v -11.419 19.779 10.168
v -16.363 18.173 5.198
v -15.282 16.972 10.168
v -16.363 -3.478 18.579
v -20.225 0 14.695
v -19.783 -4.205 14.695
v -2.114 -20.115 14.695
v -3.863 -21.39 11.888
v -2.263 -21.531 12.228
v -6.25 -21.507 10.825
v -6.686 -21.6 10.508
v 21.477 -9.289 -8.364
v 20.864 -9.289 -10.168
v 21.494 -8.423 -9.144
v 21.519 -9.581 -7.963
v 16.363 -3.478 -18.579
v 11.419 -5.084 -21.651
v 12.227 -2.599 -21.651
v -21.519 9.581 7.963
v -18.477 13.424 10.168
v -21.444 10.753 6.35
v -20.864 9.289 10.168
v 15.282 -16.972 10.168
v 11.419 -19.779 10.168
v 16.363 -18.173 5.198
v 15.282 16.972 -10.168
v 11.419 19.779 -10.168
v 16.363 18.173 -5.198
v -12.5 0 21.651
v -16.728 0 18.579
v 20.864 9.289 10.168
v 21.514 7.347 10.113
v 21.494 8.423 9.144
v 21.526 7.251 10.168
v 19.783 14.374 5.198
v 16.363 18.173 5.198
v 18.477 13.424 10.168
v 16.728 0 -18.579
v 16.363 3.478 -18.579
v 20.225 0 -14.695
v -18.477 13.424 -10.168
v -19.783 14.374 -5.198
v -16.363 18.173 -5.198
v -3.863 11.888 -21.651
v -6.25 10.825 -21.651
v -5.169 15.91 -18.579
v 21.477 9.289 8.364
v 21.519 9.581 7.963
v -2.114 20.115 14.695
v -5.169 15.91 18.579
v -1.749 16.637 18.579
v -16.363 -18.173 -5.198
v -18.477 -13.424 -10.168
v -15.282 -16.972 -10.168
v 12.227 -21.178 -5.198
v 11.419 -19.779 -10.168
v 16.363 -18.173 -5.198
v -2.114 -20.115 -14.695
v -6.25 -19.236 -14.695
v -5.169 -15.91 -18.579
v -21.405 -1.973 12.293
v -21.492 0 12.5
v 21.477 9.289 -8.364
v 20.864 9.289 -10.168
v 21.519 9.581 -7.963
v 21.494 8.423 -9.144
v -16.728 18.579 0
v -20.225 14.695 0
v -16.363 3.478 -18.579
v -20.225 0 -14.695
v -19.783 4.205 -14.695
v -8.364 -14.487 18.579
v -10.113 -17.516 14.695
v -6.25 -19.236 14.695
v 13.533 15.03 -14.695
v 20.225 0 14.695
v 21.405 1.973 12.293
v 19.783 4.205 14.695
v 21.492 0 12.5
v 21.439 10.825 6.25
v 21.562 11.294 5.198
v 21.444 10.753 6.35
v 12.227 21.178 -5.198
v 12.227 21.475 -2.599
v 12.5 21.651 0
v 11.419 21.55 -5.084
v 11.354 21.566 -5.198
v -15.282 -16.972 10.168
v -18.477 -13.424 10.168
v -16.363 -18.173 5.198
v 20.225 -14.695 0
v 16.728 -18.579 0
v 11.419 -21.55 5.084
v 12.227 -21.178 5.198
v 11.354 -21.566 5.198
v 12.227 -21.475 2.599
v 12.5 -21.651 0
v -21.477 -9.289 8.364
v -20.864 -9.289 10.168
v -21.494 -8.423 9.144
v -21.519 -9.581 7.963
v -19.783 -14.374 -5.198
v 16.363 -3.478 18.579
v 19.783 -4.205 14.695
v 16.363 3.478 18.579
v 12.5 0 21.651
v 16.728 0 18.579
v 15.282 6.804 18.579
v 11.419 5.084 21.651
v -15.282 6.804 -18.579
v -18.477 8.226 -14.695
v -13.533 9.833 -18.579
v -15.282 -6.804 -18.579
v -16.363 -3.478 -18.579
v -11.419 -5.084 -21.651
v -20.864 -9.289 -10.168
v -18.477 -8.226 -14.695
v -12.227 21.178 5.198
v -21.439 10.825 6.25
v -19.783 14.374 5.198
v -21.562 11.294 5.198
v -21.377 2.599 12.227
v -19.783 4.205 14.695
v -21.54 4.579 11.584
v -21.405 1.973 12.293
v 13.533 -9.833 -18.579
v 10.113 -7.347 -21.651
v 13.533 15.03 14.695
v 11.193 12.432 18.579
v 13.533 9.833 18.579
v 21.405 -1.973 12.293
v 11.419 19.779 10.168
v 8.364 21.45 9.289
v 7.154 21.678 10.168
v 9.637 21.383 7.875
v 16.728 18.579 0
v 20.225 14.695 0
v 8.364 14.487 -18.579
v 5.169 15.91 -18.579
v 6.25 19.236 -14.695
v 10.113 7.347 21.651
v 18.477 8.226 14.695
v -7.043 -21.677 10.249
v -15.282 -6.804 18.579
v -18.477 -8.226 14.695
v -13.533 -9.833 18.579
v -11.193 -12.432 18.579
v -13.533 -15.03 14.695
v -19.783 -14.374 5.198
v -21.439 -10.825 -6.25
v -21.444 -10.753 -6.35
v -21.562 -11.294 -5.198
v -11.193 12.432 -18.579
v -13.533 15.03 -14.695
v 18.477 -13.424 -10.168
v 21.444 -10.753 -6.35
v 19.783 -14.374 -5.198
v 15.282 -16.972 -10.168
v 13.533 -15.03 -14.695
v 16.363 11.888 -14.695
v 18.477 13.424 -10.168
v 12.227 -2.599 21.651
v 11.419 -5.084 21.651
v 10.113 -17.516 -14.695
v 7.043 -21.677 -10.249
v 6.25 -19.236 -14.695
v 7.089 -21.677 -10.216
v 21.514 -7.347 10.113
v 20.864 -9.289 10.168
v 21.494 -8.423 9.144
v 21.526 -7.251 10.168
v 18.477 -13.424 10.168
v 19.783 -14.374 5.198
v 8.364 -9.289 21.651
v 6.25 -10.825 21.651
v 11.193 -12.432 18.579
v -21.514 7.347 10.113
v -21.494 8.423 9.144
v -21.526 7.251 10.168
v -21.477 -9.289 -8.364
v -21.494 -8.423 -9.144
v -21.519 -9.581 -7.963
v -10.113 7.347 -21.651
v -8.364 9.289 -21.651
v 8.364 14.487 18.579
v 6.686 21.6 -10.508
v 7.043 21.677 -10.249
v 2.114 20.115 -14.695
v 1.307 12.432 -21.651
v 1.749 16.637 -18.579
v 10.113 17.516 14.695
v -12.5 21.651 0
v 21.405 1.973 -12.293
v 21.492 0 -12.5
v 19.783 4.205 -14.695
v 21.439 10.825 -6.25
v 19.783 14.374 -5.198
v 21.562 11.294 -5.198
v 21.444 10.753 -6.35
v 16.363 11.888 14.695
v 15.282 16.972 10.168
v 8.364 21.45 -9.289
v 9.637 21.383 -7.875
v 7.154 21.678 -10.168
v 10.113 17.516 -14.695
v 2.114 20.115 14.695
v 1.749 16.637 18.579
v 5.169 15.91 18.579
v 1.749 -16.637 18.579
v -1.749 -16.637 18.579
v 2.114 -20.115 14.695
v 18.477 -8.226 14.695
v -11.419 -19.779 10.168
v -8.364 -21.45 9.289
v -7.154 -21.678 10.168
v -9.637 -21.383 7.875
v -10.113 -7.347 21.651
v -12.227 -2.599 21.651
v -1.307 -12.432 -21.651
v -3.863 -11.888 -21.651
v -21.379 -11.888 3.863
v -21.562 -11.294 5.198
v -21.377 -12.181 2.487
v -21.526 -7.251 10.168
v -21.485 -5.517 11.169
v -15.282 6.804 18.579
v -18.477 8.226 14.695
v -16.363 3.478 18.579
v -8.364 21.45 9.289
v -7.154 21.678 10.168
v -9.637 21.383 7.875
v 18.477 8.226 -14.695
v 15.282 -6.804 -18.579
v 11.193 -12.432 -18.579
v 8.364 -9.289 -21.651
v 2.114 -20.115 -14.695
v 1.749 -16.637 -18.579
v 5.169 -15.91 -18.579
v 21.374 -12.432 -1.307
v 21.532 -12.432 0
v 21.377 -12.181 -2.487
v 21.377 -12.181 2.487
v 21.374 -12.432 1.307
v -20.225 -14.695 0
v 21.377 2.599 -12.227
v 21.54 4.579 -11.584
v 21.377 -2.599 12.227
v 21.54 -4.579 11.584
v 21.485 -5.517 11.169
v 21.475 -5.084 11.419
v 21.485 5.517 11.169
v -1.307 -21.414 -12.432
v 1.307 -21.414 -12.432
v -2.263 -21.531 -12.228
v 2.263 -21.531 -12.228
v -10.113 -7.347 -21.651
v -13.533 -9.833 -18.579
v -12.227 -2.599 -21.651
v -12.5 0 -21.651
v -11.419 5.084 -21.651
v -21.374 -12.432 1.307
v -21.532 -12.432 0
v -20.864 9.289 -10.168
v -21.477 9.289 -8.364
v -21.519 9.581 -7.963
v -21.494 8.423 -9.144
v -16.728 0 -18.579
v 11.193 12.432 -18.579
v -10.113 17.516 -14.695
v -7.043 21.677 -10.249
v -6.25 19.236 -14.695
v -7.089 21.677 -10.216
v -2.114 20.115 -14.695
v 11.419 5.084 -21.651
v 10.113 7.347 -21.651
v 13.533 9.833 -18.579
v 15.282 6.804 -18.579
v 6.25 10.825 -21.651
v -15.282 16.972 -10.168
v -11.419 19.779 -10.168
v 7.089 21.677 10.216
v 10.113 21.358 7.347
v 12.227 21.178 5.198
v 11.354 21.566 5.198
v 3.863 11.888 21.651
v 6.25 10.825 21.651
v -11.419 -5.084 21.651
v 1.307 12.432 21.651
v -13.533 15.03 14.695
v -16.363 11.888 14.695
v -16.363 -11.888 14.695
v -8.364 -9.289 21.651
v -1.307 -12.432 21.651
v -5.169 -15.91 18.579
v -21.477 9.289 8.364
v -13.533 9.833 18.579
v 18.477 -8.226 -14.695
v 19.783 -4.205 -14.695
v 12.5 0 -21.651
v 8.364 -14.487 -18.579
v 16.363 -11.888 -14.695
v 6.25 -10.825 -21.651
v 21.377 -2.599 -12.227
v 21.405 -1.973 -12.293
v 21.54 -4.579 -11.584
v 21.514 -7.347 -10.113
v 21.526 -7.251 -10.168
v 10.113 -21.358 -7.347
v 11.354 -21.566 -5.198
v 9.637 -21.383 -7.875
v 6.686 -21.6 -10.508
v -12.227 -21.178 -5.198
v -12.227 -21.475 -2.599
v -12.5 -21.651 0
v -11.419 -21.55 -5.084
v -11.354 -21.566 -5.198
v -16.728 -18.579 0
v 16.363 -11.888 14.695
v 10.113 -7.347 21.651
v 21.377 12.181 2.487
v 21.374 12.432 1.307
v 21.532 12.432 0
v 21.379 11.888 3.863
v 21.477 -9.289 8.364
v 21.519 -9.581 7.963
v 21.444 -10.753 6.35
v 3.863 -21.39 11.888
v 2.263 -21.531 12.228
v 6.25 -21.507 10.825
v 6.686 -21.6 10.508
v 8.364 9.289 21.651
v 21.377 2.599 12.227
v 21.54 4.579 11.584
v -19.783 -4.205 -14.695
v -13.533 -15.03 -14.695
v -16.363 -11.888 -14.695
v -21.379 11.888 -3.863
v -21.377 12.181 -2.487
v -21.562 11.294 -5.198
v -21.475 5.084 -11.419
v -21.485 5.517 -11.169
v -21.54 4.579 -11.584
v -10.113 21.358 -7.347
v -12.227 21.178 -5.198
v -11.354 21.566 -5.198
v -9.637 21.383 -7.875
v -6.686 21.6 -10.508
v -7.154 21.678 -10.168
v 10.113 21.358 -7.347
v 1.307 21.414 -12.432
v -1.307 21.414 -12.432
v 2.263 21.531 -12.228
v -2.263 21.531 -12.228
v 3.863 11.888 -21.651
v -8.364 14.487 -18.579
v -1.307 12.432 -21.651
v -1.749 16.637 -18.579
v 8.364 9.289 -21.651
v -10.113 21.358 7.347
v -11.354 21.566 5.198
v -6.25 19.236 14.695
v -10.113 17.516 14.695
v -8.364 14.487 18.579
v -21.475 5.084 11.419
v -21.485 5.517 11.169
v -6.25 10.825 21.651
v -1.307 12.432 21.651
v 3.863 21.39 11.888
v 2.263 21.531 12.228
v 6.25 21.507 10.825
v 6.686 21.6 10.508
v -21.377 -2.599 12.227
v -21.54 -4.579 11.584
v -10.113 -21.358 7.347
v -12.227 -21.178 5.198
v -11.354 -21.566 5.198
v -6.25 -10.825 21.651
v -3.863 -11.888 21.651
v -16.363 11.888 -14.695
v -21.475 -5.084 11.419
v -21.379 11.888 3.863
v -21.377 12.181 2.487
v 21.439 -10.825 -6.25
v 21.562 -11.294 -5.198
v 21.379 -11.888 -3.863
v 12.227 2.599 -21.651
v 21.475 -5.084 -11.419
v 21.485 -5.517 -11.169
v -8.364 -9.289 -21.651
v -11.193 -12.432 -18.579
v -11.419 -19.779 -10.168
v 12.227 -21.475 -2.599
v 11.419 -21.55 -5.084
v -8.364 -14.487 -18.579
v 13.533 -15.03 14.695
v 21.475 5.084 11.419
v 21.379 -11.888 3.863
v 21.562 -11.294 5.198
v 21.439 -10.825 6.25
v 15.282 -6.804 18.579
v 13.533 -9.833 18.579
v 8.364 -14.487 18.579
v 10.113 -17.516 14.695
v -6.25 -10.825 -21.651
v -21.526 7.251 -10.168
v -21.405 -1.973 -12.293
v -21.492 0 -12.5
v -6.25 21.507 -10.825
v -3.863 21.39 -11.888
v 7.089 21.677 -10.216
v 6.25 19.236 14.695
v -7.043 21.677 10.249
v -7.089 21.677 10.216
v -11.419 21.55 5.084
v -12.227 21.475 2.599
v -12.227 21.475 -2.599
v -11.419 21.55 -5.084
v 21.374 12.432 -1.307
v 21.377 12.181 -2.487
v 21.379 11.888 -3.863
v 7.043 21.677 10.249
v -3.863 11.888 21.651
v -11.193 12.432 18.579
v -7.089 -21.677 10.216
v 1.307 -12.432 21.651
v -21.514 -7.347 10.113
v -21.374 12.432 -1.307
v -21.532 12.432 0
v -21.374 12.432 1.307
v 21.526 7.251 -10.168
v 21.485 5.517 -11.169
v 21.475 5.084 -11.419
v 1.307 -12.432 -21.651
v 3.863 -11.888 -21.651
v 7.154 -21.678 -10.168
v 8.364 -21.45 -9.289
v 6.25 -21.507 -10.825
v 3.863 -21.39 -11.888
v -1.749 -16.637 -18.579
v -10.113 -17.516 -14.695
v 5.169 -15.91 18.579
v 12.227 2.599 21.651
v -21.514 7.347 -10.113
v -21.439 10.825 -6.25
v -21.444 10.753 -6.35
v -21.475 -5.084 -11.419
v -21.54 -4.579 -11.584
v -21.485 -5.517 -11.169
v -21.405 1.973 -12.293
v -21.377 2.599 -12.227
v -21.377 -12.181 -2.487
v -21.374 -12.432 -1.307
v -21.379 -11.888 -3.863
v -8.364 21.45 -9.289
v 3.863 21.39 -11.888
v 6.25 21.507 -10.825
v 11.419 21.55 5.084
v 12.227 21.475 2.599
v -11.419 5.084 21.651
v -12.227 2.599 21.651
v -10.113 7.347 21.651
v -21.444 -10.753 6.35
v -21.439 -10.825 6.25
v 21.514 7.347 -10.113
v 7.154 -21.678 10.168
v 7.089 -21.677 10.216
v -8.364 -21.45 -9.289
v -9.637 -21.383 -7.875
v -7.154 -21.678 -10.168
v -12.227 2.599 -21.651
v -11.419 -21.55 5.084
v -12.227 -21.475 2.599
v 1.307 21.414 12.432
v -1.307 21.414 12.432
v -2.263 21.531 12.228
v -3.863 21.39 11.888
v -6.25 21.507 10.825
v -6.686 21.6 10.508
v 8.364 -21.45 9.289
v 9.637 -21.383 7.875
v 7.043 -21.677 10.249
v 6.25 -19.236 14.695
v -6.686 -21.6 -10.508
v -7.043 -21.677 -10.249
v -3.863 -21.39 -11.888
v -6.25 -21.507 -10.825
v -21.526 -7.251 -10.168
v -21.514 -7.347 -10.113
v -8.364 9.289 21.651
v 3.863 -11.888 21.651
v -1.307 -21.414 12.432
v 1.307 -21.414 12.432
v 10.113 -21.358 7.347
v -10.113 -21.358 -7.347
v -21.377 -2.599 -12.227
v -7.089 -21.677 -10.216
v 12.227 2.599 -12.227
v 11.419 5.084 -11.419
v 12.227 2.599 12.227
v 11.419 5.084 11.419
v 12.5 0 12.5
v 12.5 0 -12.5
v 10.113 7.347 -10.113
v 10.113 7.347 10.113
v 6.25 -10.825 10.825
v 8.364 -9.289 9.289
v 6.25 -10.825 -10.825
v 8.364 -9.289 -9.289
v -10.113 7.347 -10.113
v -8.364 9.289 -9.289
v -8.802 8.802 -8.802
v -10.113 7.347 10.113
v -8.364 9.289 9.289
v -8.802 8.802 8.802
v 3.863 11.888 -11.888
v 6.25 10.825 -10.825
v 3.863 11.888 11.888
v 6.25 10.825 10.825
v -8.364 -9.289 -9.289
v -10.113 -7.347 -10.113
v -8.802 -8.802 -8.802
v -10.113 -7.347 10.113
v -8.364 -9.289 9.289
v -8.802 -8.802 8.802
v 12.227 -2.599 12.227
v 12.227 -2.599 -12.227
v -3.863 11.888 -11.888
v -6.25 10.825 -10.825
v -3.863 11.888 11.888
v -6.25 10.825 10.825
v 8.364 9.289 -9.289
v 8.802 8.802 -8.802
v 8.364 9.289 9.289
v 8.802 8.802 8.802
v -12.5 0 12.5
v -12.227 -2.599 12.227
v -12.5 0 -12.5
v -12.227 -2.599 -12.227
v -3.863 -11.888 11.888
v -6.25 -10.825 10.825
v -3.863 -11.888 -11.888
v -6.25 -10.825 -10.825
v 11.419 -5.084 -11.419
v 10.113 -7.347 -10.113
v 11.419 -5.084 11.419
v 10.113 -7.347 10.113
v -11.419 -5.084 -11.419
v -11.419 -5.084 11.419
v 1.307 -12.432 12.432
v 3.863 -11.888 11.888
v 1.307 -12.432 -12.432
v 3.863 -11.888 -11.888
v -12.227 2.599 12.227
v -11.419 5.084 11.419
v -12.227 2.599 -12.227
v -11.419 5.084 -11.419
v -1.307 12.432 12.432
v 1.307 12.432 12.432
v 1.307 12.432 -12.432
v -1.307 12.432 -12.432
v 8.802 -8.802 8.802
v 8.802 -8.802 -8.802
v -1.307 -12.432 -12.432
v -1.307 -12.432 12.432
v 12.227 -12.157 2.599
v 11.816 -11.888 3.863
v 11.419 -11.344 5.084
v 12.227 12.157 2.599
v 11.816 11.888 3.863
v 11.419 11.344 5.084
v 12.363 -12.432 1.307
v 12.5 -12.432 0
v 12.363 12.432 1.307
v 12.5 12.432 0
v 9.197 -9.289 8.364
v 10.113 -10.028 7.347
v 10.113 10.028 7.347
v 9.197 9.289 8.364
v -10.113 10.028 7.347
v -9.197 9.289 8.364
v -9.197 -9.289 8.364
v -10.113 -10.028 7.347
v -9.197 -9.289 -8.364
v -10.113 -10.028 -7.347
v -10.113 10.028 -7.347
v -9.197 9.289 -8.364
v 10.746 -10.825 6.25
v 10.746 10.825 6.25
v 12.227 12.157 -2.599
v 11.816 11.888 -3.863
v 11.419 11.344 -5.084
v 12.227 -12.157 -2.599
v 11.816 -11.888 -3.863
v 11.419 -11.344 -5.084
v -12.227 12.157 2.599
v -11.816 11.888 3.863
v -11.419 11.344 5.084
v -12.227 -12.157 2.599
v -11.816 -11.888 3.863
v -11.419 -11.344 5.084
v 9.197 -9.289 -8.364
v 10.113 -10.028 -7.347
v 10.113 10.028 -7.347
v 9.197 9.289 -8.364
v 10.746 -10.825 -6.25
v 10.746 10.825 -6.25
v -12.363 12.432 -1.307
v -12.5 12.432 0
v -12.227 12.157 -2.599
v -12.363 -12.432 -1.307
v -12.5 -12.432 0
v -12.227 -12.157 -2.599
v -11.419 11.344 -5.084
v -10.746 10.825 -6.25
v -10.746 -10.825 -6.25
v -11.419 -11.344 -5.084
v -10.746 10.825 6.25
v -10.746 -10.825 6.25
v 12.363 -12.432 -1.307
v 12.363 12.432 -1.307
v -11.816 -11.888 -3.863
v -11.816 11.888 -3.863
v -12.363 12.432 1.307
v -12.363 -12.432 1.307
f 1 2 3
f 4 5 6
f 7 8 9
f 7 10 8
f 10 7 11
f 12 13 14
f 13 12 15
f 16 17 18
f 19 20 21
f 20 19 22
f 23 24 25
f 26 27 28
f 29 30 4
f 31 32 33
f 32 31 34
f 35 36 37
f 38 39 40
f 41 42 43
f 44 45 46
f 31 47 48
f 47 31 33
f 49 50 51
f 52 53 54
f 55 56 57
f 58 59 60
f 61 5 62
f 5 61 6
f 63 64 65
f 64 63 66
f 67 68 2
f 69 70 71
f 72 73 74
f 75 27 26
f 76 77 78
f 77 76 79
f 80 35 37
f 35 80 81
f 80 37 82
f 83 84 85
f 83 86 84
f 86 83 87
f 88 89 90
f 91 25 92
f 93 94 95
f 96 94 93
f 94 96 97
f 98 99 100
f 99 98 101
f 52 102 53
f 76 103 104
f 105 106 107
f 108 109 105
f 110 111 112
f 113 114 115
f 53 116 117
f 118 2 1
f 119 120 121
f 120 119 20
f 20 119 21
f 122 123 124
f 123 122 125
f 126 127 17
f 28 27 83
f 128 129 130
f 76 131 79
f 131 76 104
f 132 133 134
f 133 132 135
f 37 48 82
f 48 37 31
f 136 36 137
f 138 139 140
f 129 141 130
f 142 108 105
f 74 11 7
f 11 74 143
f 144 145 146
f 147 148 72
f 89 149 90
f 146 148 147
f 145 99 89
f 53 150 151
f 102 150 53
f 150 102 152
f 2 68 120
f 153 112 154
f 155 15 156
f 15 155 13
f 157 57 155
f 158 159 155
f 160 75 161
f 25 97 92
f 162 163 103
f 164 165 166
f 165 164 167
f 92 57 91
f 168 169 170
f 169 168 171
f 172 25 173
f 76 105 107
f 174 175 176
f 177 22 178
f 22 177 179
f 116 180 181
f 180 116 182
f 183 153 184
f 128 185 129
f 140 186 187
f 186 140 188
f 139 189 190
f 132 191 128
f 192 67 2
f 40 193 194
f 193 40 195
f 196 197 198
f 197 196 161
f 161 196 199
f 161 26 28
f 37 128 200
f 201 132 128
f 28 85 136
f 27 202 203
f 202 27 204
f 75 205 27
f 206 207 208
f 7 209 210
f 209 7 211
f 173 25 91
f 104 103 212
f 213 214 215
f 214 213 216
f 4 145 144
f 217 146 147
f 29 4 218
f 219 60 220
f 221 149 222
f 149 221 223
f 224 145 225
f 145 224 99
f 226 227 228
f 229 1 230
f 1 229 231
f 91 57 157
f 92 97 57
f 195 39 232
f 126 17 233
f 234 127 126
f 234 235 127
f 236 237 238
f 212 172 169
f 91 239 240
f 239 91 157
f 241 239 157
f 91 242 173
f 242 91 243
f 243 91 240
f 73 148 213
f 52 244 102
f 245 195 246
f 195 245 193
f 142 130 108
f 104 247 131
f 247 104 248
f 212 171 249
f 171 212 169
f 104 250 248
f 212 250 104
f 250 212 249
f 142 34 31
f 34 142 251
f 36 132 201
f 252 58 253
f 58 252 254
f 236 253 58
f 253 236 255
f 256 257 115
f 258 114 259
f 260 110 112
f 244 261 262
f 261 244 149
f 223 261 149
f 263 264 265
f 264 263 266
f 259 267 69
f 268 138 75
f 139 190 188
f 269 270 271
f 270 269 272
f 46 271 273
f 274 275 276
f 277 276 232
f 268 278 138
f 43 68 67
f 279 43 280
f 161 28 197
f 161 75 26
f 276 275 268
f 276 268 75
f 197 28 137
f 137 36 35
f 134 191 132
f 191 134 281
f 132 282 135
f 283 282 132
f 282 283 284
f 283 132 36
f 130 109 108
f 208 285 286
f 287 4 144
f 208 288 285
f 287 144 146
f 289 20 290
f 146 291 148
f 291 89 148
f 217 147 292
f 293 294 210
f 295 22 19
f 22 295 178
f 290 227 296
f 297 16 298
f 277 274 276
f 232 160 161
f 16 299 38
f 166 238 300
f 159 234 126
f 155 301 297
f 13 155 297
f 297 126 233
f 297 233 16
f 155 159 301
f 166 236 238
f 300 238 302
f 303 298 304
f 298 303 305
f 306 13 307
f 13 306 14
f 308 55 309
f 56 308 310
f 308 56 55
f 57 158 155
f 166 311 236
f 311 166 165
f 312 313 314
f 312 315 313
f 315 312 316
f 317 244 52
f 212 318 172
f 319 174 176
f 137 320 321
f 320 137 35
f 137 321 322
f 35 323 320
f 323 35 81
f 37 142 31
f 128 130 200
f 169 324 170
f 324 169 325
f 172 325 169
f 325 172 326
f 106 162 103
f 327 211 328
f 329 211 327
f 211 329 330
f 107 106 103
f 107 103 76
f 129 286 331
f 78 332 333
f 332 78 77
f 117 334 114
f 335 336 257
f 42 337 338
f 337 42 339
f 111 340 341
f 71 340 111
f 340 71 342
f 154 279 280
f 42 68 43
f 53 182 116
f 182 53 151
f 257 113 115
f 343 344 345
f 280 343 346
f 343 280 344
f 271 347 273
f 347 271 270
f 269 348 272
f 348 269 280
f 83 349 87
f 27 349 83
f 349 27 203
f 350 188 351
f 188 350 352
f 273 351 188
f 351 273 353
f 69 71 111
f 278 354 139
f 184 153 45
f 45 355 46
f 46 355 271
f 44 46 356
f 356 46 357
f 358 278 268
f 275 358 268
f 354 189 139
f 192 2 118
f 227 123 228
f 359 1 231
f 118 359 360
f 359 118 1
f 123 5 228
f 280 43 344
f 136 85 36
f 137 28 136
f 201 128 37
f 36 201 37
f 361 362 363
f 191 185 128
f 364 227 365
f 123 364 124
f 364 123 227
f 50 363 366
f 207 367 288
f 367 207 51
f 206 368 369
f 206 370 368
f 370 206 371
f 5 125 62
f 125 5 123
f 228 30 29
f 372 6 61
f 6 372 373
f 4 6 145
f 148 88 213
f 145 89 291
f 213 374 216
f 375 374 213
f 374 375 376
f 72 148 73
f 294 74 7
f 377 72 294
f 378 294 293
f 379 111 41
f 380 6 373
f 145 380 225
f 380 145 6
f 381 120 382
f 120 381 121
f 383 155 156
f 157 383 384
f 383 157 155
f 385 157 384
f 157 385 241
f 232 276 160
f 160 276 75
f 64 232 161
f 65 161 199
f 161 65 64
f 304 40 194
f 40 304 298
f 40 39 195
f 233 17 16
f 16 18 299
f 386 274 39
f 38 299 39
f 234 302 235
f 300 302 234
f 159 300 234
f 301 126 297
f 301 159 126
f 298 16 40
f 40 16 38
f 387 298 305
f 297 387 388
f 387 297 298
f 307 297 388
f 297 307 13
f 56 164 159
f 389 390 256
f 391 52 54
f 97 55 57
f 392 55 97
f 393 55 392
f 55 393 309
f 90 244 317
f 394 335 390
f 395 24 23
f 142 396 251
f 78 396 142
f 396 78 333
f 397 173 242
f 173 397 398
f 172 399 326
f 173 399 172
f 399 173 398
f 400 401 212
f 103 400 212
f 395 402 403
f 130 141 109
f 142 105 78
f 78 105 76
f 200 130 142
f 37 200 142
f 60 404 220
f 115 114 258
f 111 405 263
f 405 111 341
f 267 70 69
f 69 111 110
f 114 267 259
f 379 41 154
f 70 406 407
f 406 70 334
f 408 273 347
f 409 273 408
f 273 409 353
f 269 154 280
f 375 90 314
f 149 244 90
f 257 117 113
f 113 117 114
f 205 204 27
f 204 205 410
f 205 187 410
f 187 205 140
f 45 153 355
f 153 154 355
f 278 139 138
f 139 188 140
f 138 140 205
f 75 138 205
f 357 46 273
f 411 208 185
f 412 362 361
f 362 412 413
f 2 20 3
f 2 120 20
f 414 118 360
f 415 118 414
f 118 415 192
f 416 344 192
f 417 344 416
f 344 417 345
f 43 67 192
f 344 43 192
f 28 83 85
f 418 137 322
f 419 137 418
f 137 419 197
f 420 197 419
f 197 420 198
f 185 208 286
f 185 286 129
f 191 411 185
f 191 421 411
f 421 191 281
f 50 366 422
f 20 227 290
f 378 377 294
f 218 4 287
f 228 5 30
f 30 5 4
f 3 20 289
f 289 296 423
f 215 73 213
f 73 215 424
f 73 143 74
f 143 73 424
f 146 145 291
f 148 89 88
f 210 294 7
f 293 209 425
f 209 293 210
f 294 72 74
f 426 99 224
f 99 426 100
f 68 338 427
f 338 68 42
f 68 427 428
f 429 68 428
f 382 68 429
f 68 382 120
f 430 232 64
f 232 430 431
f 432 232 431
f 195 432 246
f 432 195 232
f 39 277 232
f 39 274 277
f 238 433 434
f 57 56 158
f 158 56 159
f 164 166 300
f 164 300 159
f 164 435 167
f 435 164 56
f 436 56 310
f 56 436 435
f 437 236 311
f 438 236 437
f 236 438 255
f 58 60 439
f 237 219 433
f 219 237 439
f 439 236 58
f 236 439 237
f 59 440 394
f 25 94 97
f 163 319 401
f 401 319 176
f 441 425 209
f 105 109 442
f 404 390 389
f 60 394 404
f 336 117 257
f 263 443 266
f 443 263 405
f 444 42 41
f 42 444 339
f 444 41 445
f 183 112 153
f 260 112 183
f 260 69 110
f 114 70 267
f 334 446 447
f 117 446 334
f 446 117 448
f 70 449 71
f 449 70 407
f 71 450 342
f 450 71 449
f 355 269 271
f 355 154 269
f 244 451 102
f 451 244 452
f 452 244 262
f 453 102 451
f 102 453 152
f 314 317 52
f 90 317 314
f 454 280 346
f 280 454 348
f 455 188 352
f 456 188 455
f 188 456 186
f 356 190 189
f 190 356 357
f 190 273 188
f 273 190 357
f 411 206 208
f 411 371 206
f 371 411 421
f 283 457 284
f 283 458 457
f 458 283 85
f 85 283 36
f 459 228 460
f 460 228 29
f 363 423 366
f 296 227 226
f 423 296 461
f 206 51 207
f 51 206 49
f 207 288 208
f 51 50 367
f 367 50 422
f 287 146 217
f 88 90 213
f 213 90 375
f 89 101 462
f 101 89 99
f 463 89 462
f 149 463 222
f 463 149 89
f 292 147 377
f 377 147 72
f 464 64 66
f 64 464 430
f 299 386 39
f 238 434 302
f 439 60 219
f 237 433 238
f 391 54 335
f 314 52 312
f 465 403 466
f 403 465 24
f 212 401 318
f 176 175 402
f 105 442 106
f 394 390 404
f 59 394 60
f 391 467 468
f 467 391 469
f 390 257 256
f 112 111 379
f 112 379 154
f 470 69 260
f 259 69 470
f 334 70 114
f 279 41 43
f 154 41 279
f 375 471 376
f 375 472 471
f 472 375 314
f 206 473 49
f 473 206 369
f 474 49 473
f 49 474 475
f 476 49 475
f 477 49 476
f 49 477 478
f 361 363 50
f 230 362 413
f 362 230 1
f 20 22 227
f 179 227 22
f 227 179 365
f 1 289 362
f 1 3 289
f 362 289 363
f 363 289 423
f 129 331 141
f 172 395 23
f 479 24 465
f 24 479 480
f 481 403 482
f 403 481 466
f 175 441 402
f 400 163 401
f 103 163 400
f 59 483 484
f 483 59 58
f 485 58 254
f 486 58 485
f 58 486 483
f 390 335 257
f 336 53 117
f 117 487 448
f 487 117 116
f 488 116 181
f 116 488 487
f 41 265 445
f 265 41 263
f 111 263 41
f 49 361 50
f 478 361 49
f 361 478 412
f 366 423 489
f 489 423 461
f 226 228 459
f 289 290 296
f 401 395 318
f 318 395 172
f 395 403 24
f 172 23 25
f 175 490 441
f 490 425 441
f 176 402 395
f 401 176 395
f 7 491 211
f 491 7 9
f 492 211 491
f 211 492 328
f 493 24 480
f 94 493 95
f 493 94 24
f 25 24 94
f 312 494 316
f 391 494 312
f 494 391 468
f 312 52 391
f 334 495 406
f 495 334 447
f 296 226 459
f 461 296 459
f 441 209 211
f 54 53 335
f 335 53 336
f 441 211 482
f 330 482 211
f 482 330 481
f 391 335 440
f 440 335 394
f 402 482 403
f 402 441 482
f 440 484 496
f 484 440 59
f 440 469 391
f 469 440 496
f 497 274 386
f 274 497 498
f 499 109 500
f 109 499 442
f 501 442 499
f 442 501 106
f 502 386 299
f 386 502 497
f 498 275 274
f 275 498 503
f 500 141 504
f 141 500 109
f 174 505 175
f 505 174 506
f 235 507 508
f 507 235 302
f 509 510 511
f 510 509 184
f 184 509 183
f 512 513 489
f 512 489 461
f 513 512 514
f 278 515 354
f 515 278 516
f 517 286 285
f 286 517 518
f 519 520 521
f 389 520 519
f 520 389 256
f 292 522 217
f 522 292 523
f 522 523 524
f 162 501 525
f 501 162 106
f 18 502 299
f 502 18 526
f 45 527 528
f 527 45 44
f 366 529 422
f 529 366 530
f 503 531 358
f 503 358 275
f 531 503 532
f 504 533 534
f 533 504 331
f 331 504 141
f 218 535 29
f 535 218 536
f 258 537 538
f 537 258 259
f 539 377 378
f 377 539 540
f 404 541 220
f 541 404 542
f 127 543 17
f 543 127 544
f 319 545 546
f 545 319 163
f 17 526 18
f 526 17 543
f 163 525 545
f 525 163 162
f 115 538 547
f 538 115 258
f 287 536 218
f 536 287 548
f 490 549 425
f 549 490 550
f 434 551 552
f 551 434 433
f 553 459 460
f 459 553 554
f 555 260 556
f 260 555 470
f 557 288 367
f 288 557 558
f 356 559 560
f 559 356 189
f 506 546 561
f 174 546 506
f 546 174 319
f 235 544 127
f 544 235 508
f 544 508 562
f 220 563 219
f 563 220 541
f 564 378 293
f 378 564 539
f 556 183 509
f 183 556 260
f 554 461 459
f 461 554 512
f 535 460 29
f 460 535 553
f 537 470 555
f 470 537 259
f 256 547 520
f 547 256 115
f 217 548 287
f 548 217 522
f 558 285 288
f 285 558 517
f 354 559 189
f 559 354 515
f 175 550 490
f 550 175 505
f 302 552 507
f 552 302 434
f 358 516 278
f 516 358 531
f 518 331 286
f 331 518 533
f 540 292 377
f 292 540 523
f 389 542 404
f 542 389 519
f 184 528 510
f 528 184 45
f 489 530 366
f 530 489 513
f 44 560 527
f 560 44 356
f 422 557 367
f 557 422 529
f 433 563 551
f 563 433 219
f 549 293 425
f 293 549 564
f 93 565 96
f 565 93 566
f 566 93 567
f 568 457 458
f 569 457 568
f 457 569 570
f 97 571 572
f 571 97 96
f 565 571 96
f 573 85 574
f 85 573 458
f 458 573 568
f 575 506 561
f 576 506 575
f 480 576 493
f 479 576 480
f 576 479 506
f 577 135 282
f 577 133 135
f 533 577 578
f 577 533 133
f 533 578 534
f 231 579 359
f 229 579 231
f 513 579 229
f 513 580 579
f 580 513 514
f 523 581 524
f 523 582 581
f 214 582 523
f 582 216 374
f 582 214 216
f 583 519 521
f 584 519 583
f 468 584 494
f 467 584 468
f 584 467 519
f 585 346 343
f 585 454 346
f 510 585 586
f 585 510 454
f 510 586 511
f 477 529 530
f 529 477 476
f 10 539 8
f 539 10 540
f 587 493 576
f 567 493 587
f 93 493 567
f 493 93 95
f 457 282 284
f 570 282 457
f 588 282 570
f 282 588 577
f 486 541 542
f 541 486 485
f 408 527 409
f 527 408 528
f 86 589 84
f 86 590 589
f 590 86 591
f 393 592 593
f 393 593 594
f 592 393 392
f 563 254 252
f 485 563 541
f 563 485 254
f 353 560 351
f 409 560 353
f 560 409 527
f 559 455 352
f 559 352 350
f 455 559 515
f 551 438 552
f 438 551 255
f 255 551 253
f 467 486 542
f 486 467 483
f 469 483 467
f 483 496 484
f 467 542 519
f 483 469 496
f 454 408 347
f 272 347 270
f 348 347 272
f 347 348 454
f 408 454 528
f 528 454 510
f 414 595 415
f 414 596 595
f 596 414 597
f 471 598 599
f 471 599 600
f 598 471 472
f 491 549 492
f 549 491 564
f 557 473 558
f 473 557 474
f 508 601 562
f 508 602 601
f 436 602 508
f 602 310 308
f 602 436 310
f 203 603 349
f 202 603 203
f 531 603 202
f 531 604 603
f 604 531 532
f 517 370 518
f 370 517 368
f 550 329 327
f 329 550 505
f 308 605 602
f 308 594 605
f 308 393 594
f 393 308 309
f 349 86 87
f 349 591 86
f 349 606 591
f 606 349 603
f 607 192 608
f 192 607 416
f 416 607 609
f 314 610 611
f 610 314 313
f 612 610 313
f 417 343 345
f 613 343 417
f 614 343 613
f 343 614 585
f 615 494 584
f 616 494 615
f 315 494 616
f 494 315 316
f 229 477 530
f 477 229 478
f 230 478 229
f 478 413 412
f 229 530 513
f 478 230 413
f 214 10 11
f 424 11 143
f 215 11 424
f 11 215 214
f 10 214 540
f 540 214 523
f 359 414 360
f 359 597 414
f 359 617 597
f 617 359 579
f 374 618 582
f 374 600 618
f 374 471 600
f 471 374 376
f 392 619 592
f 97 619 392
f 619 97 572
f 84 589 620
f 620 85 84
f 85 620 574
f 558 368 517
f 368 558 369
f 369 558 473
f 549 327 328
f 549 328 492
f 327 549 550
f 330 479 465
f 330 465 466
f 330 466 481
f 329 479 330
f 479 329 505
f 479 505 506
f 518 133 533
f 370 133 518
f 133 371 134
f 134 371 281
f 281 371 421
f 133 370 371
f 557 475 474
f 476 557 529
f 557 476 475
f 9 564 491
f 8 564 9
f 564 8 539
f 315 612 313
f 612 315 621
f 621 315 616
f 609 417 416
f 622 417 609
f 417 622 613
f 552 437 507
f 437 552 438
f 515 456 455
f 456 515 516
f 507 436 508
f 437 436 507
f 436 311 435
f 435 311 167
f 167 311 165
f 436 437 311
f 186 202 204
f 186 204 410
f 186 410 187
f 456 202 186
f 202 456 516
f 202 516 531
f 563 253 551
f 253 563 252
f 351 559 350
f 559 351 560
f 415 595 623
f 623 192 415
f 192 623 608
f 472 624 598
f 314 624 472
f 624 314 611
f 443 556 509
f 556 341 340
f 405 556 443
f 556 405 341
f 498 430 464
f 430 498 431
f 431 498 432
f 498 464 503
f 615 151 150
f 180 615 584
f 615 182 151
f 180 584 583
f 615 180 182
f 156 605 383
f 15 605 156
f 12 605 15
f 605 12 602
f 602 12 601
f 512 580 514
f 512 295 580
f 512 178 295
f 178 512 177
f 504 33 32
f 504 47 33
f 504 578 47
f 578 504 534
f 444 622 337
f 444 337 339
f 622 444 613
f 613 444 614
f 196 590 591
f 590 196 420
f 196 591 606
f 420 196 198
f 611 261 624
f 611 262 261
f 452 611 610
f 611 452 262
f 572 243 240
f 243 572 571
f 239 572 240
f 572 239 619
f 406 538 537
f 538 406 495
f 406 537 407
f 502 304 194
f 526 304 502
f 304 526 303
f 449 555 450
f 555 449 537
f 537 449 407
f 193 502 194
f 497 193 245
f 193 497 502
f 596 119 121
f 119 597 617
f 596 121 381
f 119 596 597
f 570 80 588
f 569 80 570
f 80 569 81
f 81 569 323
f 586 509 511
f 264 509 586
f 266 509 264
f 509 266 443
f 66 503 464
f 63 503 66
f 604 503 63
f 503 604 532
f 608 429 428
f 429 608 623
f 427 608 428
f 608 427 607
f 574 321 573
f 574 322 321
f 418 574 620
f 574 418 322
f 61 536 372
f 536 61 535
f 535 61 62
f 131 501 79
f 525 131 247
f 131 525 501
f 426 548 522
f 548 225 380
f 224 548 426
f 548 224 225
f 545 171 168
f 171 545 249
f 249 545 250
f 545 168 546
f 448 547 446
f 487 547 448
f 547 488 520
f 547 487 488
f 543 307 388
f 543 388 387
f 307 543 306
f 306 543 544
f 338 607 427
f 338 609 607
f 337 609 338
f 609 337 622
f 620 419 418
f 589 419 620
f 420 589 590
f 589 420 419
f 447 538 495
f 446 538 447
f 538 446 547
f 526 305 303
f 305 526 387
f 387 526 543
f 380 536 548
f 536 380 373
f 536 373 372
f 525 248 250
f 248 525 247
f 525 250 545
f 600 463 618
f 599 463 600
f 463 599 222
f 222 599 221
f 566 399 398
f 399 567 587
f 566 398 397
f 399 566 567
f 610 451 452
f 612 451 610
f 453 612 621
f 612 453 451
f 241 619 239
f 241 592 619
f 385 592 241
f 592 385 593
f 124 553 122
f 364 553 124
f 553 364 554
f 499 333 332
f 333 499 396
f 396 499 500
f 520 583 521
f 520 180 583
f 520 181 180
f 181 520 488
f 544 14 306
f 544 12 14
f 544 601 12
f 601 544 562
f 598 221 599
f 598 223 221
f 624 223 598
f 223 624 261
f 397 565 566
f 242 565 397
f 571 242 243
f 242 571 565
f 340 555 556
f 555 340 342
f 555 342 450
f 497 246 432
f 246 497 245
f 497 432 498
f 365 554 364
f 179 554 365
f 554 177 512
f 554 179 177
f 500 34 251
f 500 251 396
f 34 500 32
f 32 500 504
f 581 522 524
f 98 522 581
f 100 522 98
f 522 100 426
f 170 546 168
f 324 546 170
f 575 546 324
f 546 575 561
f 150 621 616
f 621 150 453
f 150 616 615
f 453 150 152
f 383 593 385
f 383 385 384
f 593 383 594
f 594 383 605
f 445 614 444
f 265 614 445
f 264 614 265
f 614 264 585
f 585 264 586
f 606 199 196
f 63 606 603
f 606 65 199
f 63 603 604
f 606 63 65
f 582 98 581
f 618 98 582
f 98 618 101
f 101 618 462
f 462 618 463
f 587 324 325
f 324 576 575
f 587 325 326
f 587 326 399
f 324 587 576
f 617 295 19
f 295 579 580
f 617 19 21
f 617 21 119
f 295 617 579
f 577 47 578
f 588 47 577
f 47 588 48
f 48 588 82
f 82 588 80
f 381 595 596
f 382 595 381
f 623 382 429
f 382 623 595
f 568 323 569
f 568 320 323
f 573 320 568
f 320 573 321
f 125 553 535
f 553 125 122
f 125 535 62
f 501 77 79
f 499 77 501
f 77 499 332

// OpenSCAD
//created with rubyscad 1.0

difference() {
   sphere(r = 25.000); 
   rotate(a = 90, v = [0, 0, 0]) 
   cylinder(r = 12.500, h = 62.500, center = true); 
   rotate(a = 90, v = [1, 0, 0]) 
   cylinder(r = 12.500, h = 62.500, center = true); 
   rotate(a = 90, v = [0, 1, 0]) 
   cylinder(r = 12.500, h = 62.500, center = true); 
}
